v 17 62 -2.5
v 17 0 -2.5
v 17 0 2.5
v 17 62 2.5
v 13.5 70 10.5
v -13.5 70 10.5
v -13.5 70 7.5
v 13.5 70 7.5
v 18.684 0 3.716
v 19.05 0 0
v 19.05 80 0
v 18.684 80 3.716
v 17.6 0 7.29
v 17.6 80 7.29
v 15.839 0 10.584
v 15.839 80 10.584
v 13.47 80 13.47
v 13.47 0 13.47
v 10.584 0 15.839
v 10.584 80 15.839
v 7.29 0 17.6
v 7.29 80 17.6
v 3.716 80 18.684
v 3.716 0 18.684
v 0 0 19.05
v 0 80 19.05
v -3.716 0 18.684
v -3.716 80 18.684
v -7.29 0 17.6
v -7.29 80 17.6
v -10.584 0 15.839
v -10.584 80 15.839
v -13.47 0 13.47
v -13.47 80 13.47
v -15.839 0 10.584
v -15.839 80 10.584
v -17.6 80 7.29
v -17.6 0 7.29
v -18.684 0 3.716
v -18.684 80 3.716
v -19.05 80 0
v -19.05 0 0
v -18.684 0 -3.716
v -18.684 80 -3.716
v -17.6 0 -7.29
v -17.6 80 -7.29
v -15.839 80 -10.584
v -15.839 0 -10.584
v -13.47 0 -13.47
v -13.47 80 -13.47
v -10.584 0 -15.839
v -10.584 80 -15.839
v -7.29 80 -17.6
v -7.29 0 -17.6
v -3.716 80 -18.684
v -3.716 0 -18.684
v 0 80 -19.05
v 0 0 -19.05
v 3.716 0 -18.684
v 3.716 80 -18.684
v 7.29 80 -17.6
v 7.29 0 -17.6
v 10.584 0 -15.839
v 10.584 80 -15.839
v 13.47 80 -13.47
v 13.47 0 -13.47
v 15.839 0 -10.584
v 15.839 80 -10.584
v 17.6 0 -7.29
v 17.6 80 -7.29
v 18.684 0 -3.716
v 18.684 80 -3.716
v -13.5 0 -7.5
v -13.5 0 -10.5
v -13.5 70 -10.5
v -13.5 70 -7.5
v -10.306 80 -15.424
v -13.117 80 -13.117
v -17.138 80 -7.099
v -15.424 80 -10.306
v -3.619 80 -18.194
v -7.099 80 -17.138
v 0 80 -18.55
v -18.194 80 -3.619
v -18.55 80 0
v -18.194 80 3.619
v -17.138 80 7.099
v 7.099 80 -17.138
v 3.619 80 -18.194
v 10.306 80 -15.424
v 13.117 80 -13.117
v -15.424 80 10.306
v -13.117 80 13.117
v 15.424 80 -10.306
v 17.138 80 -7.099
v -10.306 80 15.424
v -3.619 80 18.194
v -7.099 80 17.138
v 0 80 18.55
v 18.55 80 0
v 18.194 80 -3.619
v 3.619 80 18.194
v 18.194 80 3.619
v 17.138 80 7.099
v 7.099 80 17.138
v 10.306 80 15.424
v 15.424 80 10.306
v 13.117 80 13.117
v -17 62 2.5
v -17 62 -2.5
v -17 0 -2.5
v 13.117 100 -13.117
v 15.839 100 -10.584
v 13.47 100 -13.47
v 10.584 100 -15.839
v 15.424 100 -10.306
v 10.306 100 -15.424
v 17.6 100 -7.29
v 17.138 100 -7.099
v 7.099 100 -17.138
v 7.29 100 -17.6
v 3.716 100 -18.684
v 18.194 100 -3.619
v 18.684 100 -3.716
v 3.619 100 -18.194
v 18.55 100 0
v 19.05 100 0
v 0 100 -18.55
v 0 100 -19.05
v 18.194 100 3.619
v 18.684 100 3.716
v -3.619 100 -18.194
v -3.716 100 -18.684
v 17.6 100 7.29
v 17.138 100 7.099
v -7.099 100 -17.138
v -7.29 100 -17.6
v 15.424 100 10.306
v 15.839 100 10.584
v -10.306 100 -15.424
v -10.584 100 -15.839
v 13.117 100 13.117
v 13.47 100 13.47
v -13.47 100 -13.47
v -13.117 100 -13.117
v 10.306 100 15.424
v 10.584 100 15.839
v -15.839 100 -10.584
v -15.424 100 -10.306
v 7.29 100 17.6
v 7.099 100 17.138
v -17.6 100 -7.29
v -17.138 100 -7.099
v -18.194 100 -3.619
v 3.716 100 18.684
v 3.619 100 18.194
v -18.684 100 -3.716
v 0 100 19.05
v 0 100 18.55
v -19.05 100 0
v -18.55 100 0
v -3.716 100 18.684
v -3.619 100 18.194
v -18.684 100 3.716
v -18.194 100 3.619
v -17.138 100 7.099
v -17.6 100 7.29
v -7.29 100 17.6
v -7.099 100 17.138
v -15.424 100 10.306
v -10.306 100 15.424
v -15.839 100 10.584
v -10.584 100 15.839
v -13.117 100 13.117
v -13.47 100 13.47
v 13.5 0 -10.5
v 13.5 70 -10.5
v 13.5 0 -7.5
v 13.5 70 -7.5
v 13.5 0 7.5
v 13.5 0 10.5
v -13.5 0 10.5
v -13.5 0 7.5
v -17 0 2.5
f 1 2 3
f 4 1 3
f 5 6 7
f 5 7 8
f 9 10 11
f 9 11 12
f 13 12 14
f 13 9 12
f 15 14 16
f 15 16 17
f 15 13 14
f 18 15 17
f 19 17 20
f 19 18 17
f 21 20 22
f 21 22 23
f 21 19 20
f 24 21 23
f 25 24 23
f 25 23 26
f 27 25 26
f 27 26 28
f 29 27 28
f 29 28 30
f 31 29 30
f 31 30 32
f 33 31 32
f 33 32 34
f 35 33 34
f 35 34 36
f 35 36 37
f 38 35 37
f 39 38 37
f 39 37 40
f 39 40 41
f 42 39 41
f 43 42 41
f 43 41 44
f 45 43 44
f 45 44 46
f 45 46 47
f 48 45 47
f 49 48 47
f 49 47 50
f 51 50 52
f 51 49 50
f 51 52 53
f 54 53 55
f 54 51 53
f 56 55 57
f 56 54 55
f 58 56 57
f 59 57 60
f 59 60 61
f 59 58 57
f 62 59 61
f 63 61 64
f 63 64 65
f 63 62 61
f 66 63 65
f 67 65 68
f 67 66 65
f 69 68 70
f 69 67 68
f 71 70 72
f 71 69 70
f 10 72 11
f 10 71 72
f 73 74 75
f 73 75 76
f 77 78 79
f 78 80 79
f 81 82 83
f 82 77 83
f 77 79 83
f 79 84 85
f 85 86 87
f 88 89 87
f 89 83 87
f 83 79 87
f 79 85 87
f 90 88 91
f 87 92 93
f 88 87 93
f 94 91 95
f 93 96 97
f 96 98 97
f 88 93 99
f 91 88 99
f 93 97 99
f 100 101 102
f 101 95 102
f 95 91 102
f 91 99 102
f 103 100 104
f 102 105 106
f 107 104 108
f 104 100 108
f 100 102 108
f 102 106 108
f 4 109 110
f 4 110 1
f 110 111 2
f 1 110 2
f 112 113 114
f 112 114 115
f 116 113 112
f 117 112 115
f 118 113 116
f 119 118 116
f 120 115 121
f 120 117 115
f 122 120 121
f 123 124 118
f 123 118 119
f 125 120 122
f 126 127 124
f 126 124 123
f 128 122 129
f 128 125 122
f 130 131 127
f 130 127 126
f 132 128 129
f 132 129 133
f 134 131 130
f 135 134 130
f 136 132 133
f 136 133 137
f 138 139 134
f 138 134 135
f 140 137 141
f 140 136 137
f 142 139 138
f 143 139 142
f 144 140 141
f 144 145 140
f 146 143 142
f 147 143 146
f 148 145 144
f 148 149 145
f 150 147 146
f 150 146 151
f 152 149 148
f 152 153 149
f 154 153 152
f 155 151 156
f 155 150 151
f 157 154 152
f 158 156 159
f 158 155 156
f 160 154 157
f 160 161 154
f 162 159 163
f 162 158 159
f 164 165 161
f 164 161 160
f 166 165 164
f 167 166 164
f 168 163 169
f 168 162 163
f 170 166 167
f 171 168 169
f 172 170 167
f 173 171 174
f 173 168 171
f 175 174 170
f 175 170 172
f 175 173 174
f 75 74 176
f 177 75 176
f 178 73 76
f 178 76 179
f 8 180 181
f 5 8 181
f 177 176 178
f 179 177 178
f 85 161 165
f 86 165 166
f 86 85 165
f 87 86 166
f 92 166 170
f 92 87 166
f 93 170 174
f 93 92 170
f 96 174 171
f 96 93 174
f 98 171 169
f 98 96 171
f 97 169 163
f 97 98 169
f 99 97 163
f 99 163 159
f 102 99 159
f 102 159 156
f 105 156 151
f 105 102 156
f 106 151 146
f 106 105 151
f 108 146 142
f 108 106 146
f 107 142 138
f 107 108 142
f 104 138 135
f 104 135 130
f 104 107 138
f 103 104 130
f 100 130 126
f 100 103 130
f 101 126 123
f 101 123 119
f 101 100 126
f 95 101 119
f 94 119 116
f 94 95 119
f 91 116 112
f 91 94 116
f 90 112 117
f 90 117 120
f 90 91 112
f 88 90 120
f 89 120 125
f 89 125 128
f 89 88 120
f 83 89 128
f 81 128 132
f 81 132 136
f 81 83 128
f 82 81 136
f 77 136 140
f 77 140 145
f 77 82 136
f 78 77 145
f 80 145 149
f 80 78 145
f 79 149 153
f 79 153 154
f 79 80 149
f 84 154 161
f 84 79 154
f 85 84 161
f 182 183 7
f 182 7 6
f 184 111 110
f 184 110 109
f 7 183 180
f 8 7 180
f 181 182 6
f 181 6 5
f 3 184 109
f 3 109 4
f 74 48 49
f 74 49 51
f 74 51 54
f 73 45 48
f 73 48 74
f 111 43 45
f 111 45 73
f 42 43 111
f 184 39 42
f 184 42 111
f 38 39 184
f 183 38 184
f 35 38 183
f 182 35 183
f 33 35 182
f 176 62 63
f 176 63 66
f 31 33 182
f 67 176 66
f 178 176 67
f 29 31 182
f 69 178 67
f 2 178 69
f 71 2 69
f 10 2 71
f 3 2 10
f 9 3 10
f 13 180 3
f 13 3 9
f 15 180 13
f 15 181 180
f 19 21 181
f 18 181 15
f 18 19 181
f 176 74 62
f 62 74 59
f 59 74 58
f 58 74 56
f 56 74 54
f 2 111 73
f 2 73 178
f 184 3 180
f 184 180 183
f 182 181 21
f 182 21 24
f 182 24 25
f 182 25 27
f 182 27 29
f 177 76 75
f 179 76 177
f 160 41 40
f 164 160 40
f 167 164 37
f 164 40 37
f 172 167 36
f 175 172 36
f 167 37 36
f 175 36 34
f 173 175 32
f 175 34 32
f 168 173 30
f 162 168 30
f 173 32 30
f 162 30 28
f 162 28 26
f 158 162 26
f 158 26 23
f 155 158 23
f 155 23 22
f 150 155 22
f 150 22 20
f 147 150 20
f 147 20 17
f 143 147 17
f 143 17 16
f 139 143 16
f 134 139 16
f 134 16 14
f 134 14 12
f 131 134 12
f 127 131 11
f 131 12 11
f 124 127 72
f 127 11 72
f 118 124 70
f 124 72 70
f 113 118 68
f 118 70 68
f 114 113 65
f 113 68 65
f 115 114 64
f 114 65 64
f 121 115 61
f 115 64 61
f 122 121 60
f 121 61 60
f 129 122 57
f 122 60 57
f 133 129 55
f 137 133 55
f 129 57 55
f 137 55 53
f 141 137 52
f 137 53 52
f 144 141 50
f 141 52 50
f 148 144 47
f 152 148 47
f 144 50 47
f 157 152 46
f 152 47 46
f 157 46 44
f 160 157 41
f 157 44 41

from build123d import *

# Parameters (mm, degrees)
F0_R     = 19.05
F1_DEPTH = 80
F4_R     = 19.05
F4_R_2   = 18.55
F5_DEPTH = 20
F3_W     = 27
F3_H     = 3
F6_DEPTH = 70
F8_W     = 34
F8_H     = 5
F9_DEPTH = 62


with BuildPart() as f1:
    # F0 (on Front) → F1 (new body)
    with BuildSketch(Plane.XZ):
        Circle(F0_R)
    extrude(amount=-F1_DEPTH)

    # F4 (on face) → F5 (join)
    with BuildSketch(Plane(origin=(0, 80, 0), x_dir=(-1, 0, 0), z_dir=(0, 1, 0))):
        Circle(F4_R)
        Circle(F4_R_2, mode=Mode.SUBTRACT)
    extrude(amount=F5_DEPTH)

    # F3 (on Front) → F6 (cut)
    with BuildSketch(Plane.XZ):
        with Locations((0, 9)):
            Rectangle(F3_W, F3_H)
        with Locations((0, -9)):
            Rectangle(F3_W, F3_H)
    extrude(amount=-F6_DEPTH, mode=Mode.SUBTRACT)

    # F8 (on Front) → F9 (cut)
    with BuildSketch(Plane.XZ):
        Rectangle(F8_W, F8_H)
    extrude(amount=-F9_DEPTH, mode=Mode.SUBTRACT)


solid = f1.part
